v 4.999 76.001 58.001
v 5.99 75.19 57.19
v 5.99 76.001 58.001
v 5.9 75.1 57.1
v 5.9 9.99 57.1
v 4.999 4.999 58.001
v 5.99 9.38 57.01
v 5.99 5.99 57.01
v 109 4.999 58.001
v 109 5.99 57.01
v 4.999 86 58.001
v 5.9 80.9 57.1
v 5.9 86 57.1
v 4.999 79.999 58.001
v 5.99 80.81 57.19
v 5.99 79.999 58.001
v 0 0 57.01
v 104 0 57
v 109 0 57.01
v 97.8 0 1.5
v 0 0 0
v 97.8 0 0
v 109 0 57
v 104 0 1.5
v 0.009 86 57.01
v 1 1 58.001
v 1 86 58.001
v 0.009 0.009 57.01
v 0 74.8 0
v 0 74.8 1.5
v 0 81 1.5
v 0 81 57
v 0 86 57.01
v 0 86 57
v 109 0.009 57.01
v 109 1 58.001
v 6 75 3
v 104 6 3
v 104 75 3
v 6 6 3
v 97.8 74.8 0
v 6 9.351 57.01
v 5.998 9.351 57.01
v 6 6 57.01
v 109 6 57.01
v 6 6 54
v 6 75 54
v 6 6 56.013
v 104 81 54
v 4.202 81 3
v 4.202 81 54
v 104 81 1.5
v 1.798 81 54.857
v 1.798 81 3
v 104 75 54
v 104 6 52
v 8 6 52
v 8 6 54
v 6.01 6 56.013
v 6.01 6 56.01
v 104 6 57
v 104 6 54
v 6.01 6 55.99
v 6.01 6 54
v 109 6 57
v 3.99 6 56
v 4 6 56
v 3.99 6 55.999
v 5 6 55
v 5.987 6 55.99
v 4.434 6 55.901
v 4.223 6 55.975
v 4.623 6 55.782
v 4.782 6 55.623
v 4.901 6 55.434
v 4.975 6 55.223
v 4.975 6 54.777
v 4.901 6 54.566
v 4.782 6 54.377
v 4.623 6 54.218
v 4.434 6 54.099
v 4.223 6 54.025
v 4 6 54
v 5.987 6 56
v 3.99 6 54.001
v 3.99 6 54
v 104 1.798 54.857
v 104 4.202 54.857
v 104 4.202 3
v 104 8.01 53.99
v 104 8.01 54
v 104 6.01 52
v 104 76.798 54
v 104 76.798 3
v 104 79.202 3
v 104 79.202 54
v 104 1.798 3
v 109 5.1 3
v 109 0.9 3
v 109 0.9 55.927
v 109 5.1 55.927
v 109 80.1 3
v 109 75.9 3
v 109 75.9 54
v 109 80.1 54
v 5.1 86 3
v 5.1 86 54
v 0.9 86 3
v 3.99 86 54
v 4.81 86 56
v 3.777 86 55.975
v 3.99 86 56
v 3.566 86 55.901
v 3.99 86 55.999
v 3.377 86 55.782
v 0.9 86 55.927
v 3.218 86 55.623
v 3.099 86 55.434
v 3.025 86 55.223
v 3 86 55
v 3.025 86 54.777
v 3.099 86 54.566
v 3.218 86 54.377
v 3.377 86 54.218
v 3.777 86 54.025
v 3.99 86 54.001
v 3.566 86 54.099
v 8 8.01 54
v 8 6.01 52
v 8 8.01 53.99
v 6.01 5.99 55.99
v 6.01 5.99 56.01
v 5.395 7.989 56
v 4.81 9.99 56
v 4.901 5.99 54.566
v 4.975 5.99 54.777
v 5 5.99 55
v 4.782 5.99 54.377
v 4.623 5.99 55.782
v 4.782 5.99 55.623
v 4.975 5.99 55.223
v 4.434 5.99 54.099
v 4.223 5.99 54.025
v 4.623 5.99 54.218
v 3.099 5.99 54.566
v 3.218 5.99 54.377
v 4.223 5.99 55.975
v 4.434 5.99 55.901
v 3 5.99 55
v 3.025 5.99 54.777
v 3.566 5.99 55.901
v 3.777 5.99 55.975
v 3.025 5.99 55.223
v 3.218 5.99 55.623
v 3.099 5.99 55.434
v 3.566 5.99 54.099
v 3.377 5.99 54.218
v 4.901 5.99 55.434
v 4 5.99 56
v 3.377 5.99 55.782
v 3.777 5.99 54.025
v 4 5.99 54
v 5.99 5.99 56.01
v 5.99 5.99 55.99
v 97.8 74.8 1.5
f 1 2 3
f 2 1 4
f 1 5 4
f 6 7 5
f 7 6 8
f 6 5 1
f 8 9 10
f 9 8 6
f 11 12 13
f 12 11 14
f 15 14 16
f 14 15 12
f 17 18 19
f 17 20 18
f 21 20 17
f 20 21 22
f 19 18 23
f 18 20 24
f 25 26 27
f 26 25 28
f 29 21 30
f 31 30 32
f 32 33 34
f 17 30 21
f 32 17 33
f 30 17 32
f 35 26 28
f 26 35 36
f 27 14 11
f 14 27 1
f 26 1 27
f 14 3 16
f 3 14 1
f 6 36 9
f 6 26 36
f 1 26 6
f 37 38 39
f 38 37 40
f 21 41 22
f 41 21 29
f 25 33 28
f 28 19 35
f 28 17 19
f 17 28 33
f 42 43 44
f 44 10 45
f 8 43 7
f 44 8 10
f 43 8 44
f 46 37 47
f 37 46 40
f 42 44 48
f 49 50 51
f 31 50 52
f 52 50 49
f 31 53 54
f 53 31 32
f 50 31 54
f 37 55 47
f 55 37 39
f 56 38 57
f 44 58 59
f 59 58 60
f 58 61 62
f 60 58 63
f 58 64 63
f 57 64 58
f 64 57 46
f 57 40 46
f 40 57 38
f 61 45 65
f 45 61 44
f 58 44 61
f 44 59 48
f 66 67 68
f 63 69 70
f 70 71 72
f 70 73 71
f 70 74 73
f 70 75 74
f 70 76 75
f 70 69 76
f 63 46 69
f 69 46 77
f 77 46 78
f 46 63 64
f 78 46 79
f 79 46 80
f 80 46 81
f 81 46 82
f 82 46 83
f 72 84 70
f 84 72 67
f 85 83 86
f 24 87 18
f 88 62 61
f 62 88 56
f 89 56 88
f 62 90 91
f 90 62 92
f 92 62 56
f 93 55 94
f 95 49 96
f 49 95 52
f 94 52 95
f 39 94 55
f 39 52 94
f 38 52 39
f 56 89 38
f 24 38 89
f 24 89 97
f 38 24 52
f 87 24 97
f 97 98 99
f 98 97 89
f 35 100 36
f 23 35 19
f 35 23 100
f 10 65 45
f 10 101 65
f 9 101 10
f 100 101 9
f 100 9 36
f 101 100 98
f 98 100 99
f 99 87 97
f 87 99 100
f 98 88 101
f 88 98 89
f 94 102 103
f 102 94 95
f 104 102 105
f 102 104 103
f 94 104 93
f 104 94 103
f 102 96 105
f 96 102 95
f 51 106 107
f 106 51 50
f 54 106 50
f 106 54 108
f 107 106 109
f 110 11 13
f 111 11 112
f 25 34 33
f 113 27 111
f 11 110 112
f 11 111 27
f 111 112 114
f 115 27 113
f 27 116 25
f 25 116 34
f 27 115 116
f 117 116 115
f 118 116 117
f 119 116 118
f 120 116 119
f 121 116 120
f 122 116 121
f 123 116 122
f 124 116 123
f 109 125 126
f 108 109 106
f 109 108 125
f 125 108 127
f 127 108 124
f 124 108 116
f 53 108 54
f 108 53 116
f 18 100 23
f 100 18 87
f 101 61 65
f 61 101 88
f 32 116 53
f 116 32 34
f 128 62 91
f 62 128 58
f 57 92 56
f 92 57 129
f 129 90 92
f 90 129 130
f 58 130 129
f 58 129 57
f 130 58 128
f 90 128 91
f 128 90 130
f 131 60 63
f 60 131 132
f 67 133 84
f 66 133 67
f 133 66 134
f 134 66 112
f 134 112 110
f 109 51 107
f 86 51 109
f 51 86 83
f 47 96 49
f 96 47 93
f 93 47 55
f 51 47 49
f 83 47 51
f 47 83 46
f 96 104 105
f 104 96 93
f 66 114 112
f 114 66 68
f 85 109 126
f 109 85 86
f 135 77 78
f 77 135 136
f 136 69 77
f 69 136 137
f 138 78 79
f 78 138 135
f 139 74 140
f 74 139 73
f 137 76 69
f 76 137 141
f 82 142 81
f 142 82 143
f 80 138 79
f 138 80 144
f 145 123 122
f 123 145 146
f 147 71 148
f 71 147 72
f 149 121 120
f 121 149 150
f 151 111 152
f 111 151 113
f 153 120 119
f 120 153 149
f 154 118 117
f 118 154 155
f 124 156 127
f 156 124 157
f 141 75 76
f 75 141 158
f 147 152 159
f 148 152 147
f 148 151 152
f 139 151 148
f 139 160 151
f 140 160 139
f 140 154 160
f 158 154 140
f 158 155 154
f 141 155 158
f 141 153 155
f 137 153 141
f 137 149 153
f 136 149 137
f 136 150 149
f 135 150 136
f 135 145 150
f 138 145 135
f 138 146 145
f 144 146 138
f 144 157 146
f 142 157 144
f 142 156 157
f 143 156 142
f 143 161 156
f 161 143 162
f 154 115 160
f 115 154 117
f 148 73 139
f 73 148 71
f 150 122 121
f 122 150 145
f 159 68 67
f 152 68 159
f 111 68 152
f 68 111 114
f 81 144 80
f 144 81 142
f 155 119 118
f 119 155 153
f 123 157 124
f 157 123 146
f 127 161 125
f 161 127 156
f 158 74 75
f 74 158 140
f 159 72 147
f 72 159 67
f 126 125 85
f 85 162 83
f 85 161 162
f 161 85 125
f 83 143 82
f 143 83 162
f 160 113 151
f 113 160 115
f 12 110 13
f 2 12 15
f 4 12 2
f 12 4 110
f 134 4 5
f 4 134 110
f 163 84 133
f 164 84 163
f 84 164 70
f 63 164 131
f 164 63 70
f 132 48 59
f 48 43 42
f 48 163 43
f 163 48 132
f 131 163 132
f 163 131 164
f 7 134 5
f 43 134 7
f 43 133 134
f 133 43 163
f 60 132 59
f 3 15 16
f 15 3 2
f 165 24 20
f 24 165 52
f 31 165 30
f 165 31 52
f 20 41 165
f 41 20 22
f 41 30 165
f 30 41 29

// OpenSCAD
// ============================================================================
// cutlery_box.scad
// Graduated 3-chamber disposable-cutlery box (Option 3) — CUT-FROM-SOLID port
// of build_box.py, for a 120 x 120 x 120 mm printer (AOSEED).
//
// WHY THIS PORT EXISTS (the whole point):
//   The hand-mesh generator (build_box.py) could not keep the 1 mm rim chamfer
//   continuous across the female dovetail joints, because where a slot's flared
//   corner crosses the sloped chamfer it needs a true boolean intersection.
//   OpenSCAD HAS that boolean kernel, so here we do exactly the "cut-from-solid"
//   thing:
//      1. Build the ENTIRE box as ONE solid, WITH the chamfer already on it.
//      2. difference() out vertical dovetail prisms ( /_\ cross-section ),
//         running from just above the base plate up THROUGH the rim, to both
//         (a) form the sliding-dovetail joints, and
//         (b) split the box into 6 bed-sized pieces.
//   Because the cut is a real boolean through the already-chamfered solid, the
//   sloped chamfer<->slot edge is produced for free => the rim chamfer stays
//   CONTINUOUS across every joint, with none of the sliver hacks.
//
// ----------------------------------------------------------------------------
// HOW TO USE
//   In the app:  set `part` below (or use the Customizer dropdown), F5 to
//                preview, F6 to render, then File > Export > STL.
//   One piece (CLI):
//      openscad -o body_knife_A.stl -D 'part="knife_A"' cutlery_box.scad
//   ALL SIX (bash, run from this folder):
//      for p in knife_A knife_B fork_A fork_B spoon_A spoon_B; do \
//        openscad -o "body_$p.stl" -D "part=\"$p\"" cutlery_box.scad ; done
//   PNG preview of one piece:
//      openscad -o knife_B.png --imgsize=1400,1000 --autocenter --viewall \
//        -D 'part="knife_B"' cutlery_box.scad
//
//   Pieces are modelled in ASSEMBLED coordinates (floor-down, z=0 is the bed),
//   so importing all six STLs together shows the assembled box directly; your
//   slicer will auto-drop each one onto the plate for printing.
//
// BED SANITY: every piece is <= 120 mm in X, Y, Z.
//   Z = 58 mm. Widest piece = spoon at 117 mm (Y). A-halves reach 109 mm (X,
//   including the protruding dovetail key). All under 120.
//
// !! I could NOT run OpenSCAD to verify this file (no binary in my sandbox) !!
//   - The rim chamfer is a SMOOTH, true-45 bevel built from hull() frustums of
//     convex rectangles. Works in every OpenSCAD since ~2015 (incl. Homebrew
//     2021.01). No stepped staircase -- and, crucially, it makes box() a clean
//     well-formed solid so the per-part booleans resolve reliably (the old
//     14-slice staircase was fragile and CGAL was dropping the walls of the
//     interior parts, leaving only the key prisms => "floating boxes").
//   - roof() is still available behind USE_ROOF=true for those who have it
//     (2021.01+ snapshots); for THIS rectangular design it is identical, so it
//     is NOT required.
//   - After F6, check the console for "WARNING"/"not a valid 2-manifold".
//     If a tenon ever looks detached, bump EPS to 0.05.
// ============================================================================


/* [Part to render / export] */
part = "knife_A"; // [knife_A, knife_B, fork_A, fork_B, spoon_A, spoon_B, assembly]

/* [Chamfer method] */
// false = smooth hull() frustum bevel (default, any OpenSCAD); true = roof() (2021.01+)
USE_ROOF = false;

/* [Heights (mm)] */
BASE   = 3.0;     // floor / base-plate thickness
COMP_H = 55.0;    // interior wall height above the floor (cutlery stack depth)

/* [Walls (mm)] */
HOST_T   = 6.0;     // thickness of every wall (thick enough to host a dovetail)
HALF_LEN = 104.0;   // printed length of each half (A = near, B = far); <120 incl. key

/* [Chamber bays (mm)] */
N_COL     = 3;       // columns of cutlery per chamber
KNIFE_COL = 23.0;    // -> knife bay 69  (3 x 19 mm knives + play)
FORK_COL  = 33.0;    // -> fork  bay 99  (3 x 29 mm forks  + play)
SPOON_COL = 37.0;    // -> spoon bay 111 (3 x 34 mm spoons + play, trimmed <120)

/* [Dovetail joint (mm)] */
DT_DEPTH = 5.0;   // tail protrusion past the seam (male key depth)
DT_NECK  = 1.2;   // half-width at the seam face (narrow)
DT_FLARE = 2.1;   // half-width at the tip (wide -> locks)
DT_CLR   = 0.4;   // FLANK/seam slide clearance added to the female socket (do not change for fit)
DT_DEPTH_RELIEF = 0.3; // extra depth on the socket BACK only, so the tail tip never bottoms out

/* [Hidden-dovetail top cap / "hat" (mm)] */
// The dovetail otherwise shows its trapezoid outline on the TOP edge of the wall.
// To hide it, the MALE piece extends the wall's full-width top (chamfer included)
// across the key footprint -> a flush, continuous top. The FEMALE piece gets a
// matching top RECESS (cap footprint + CAP_CLR) so the cap drops straight in.
// Result: the top reads as one surface with a single straight seam line at the cap
// tip; the dovetail joinery lives entirely below the cap.
//
// SELF-SUPPORTING UNDERSIDE: the cap reaches the FULL wall width at the chamfer base
// (so the top edge reads as the wall extended, with NO recessed sliver on the outer
// face), and its underside is ONE planar ramp from the chamfer's OUTER CORNER
// (half-width HOST_T/2 at z = BODY_H-CHAMFER) down to the dovetail-neck half-width
// (CAP_FOOT) at CAP_SLANT_DEG from horizontal. No little horizontal step. The ramp
// reaching full width exactly at the chamfer base means "ramp top" == "chamfer base"
// (CAP_H is DERIVED). The FEMALE recess is the same ramp + CAP_CLR play.
// TRADEOFF: because the cap runs all the way to the outer corner, the female wall
// tapers to ~0 at z = BODY_H-CHAMFER -> a thin feather edge at the joint (gradual at
// CAP_SLANT_DEG, hidden inside the joint when assembled). Accepted per design intent.
CAP_SLANT_DEG = 50;     // cap underside ramp angle from horizontal (50 = self-supporting, long flare)
CAP_FOOT = DT_NECK;     // cap-underside half-width where it meets the dovetail neck
CAP_CLR = 0.3;          // slide clearance so the male cap seats into the female top recess

/* [Rim chamfer (mm)] */
CHAMFER = 1.0;    // 45-deg comfort break broken along the top wall edges

/* [Base half-lap / anti-warp (mm)] */
// Neighbouring base plates overlap as a HORIZONTAL half-lap (shiplap) at mid-base
// height, so corners stay coplanar (no lift/protrusion). Horizontal lap faces do
// NOT bind the vertical-drop assembly. Shingle direction: A->B and knife->fork->spoon.
LAP_LEN = 6;        // overlap past the A/B seam and the knife/fork seam
LAP_LEN_FS = 2;     // overlap past the fork/SPOON seam -- SMALLER: spoon is the
                    // tightest piece (117mm of the 120mm bed); a 6mm lap there
                    // would push spoon to 123mm. 2mm keeps spoon at 119mm.
LAP_Z   = BASE/2;   // 1.5 -- horizontal split height of the lap (bottom vs top half)
LAP_CLR = 0.2;      // in-plane clearance so the shelf isn't a press fit

/* [Lid — box features that receive a flat ORDERED clear sheet] */
// The lid itself is NOT printed: it's a flat ~2 mm PETG/Tritan sheet, bullnose-polished
// edges (r=LID_EDGE_R), ordered to size. We only model the box features that receive it.
LID_T            = 2.0;   // ordered sheet thickness
LID_EDGE_R       = 1.0;   // ordered sheet bullnose edge radius (for the sheet order spec)
LID_PLAY         = 0.4;   // total vertical play in the hinge groove (sheet + this)
LID_RECESS       = 2.0;   // lid TOP sits this far BELOW the rim, so the journal pocket is fully
                          // capped (rim caps the bullnose -> retains the lid when raised; tilt-in)
HINGE_AT_MINUS_X = true;  // hinge on the -x (303mm) end wall; clip on +x. (flip = mirror; default delivered)
// perimeter support ledge (lid underside rests on it at z = BODY_H-LID_T)
LEDGE_W          = 2.0;   // ledge inward protrusion (its underside ramps back at 45 deg -> self-supporting)
GROOVE_END_INSET = 0.0;   // journal runs the full chamber width, right to the corners
GROOVE_TAPER     = 4.0;   // y-length over which the eased mouth tapers out at each groove end
// hinge journal (cut into the inner face of the hinge end wall, CONTINUOUS along the long edge)
GROOVE_DEPTH     = 3.0;   // 2mm lead-in slot + 1mm pocket radius -> journal sits 2mm back from the
                          // face so its cap clears the swing relief and RETAINS the lid
GROOVE_POCKET_R  = 1.0;   // journal half-cylinder radius (the bullnose sheet edge rolls in it)
GROOVE_MOUTH_EASE= 1.2;   // 45 deg ease on the slot's inner-top lip so the sheet swings up & lifts out
// clip latch (one localized retainer, centered on the clip end wall)
CLIP_W           = 18.0;  // clip width
CLIP_LIP         = 0.4;   // retaining overhang (0.3 light .. 0.6 firm)
CLIP_RAMP_H      = 1.6;   // cam-ramp height above the rim (press-to-close)
// finger scallop (semicircular dish in the rim, centered on & aligned with the clip)
SCALLOP_W        = 16.0;  // scallop width
SCALLOP_DEPTH    = 6.0;   // how far it dishes down from the rim


/* [Hidden] */
EPS      = 0.01;          // tiny overlap so abutting solids fuse cleanly in CGAL
// Upper-chamber pieces (fork, spoon) were cut by a cell plane laid EXACTLY on the
// divider wall's far face (the lower chamber owns that wall). intersection() along a
// plane coincident with an existing box face makes CGAL leave a ZERO-THICKNESS copy
// of the wall face -> edge-manifold + "watertight" but degenerate (OpenSCAD shows it
// as a blue back-face; Tinkercad thickens it into a phantom block). SEAM_EPS nudges
// those cut planes a hair INTO the open bay so they no longer coincide with any box
// face -> no flap. 0.02 mm is physically nothing but is well clear of CGAL's tolerance.
SEAM_EPS = 0.02;
CUT_OVER = 1.0;           // how far dovetail cutters overshoot the rim (clean cut)

BODY_H    = BASE + COMP_H;     // 58  total height
END_WALL  = HOST_T;            // end walls are dovetail hosts too -> equally thick
TOTAL_LEN = 2 * HALF_LEN;      // 208 assembled length (end wall .. end wall)

// hidden-cap ramp geometry (derived).
//   CAP_HW    = cap MAX half-width = HOST_T/2 (the full wall edge) at the chamfer base.
//   CAP_RISE  = vertical height of the self-supporting CAP_SLANT_DEG underside ramp.
//   CAP_ZRAMP = where the cap reaches full width = the chamfer base (BODY_H-CHAMFER), so
//               the ramp runs straight to the chamfer OUTER CORNER (no horizontal step).
//   CAP_ZBOT  = cap bottom = ramp start; CAP_H derived from it (for reference/report).
//   CAP_ZRAMP_R = recess ramp top, shifted down by CAP_CLR so the recess ramp stays
//               parallel to the cap ramp with uniform play.
CAP_HW      = HOST_T/2;   // cap reaches the FULL wall edge at the chamfer base
CAP_RISE    = (CAP_HW - CAP_FOOT) * tan(CAP_SLANT_DEG);
CAP_ZRAMP   = BODY_H - CHAMFER;               // full width exactly at the chamfer base / outer corner
CAP_ZBOT    = CAP_ZRAMP - CAP_RISE;
CAP_H       = BODY_H - CAP_ZBOT;              // derived; reported
CAP_ZRAMP_R = CAP_ZRAMP;   // recess ramp ALSO tops at the chamfer corner (mirror the cap) -> no vertical lip
// sanity checks
assert(CAP_ZBOT > BASE + 1,
       "cap zone dips too low -- raise CAP_SLANT_DEG");
assert(CAP_HW >= DT_FLARE,
       "cap too narrow to cover the dovetail tail");

// NOTE: lid-derived constants are defined BELOW the Y-layout block, because some of
// them (INTERIOR_Y0/Y1, CLIP_CY) depend on OUTER_L / OUTER_R / EXT_W. See "lid derived".

// bay widths
KNIFE_BAY = N_COL * KNIFE_COL; // 69
FORK_BAY  = N_COL * FORK_COL;  // 99
SPOON_BAY = N_COL * SPOON_COL; // 111

// ---- Y layout (width direction): wall | bay | divider | bay | divider | bay | wall
KNIFE_Y0 = 0;
KNIFE_Y1 = HOST_T + KNIFE_BAY + HOST_T;        // 0..81   (outer wall + bay + divider)
FORK_Y0  = KNIFE_Y1;                           // 81
FORK_Y1  = FORK_Y0 + FORK_BAY + HOST_T;        // 81..186 (bay + divider)
SPOON_Y0 = FORK_Y1;                            // 186
SPOON_Y1 = SPOON_Y0 + SPOON_BAY + HOST_T;      // 186..303(bay + outer wall)
EXT_W    = SPOON_Y1;                           // 303 total width

// lengthwise wall Y-bands [y0,y1] (host the A/B dovetails) + their centers
OUTER_L  = [0, HOST_T];                                       // [0,6]    c=3
DIV_KF   = [HOST_T + KNIFE_BAY, HOST_T + KNIFE_BAY + HOST_T]; // [75,81]  c=78
DIV_FS   = [FORK_Y0 + FORK_BAY, FORK_Y0 + FORK_BAY + HOST_T]; // [180,186]c=183
OUTER_R  = [SPOON_Y1 - HOST_T, SPOON_Y1];                     // [297,303]c=300

// ---- lid derived ---- (placed AFTER OUTER_L/OUTER_R/EXT_W so nothing is forward-referenced)
LID_TOP_Z   = BODY_H - LID_RECESS;        // 56  lid TOP (recessed); rim z=58 rises LID_RECESS above it
LID_Z_UNDER = LID_TOP_Z - LID_T;          // 54  lid underside / ledge top / lowered-divider top
POCKET_CZ   = LID_TOP_Z - LID_T/2;        // 55  journal centre (lid mid) -> pocket top = LID_TOP_Z = capped
// hinge end-wall inner face x + inward direction; clip end-wall inner face x + inward dir
HINGE_INX   = HINGE_AT_MINUS_X ? END_WALL : TOTAL_LEN - END_WALL;       // 6  (default)
HINGE_IN    = HINGE_AT_MINUS_X ? 1 : -1;  // interior direction from the hinge wall (+x default)
CLIP_INX    = HINGE_AT_MINUS_X ? TOTAL_LEN - END_WALL : END_WALL;       // 202 (default)
CLIP_IN     = HINGE_AT_MINUS_X ? -1 : 1;  // interior direction from the clip wall (-x default)
POCKET_CX   = HINGE_INX - HINGE_IN*(GROOVE_DEPTH - GROOVE_POCKET_R);    // 5  pocket centre x (INTO the wall)
INTERIOR_Y0 = OUTER_L[1];                 // 6   inner face of the -y short wall
INTERIOR_Y1 = OUTER_R[0];                 // 297 inner face of the +y short wall
CLIP_CY     = EXT_W/2;                     // 151.5 clip/scallop centre (in the fork chamber)
assert(POCKET_CZ - GROOVE_POCKET_R > BASE + 1,
       "journal dips too low -- reduce LID_RECESS or LID_T");
assert(POCKET_CZ + GROOVE_POCKET_R <= LID_TOP_Z + EPS,
       "journal not capped -- lower the lid (raise LID_RECESS) or shrink GROOVE_POCKET_R");
// NOTE: with LID_RECESS the lid underside (and lowered dividers) sit BELOW CAP_ZBOT. That is
// intended: the inner dividers are cut flat below the cap zone (their hidden caps are removed,
// but the lid covers them); the perimeter/end-wall caps are untouched (full-height walls).

// the three OPEN bays are rectangular holes in the wall footprint:
//   footprint = outer rectangle MINUS these bays  (== the 6 walls; verified).
// The smooth chamfer is built from exactly this decomposition.
BAY_X0 = END_WALL;              // 6
BAY_X1 = TOTAL_LEN - END_WALL;  // 202
BAYS = [
    [BAY_X0, BAY_X1, HOST_T,   HOST_T + KNIFE_BAY],   // knife bay [6,202] x [6,75]
    [BAY_X0, BAY_X1, FORK_Y0,  FORK_Y0 + FORK_BAY],   // fork  bay [6,202] x [81,180]
    [BAY_X0, BAY_X1, SPOON_Y0, SPOON_Y0 + SPOON_BAY], // spoon bay [6,202] x [186,297]
];

YC_OUTL  = OUTER_L[0] + HOST_T/2;   // 3   outer-left wall center
YC_DIVKF = DIV_KF[0]  + HOST_T/2;   // 78  knife/fork divider center
YC_DIVFS = DIV_FS[0]  + HOST_T/2;   // 183 fork/spoon divider center
YC_OUTR  = OUTER_R[0] + HOST_T/2;   // 300 outer-right wall center

// seams
AB_SEAM = HALF_LEN;               // 104  A/B length seam (x)
SEAM_KF = FORK_Y0;                // 81   knife/fork width seam (y)
SEAM_FS = SPOON_Y0;              // 186  fork/spoon width seam (y)
ENDC_A  = END_WALL/2;             // 3    A end-wall center (x) -> chamber dovetails
ENDC_B  = TOTAL_LEN - END_WALL/2; // 205  B end-wall center (x)


// ============================================================================
// 2D wall footprint (cross-section of all walls, constant in z for the straight
// part). Union of: 2 full-width end walls + 4 lengthwise walls between them.
// ============================================================================
module wall_footprint_2d() {
    // footprint = outer rectangle minus the 3 open bays  (== the 6 walls)
    difference() {
        square([TOTAL_LEN, EXT_W]);
        for (b = BAYS) translate([b[0], b[2]]) square([b[1] - b[0], b[3] - b[2]]);
    }
}

// ============================================================================
// The full chamfered box solid = base plate + walls with a continuous 1 mm
// top-rim chamfer. Built ONCE; every piece is carved out of this.
// ============================================================================
module chamfer_cap() {
    // SMOOTH 45 rim chamfer over z[BODY_H-CHAMFER, BODY_H], in absolute coords.
    zm = BODY_H - CHAMFER;
    if (USE_ROOF) {
        // exact straight-skeleton roof, capped at CHAMFER height (needs roof()).
        intersection() {
            translate([0,0,zm]) roof() wall_footprint_2d();
            translate([0,0,zm]) linear_extrude(CHAMFER + EPS) wall_footprint_2d();
        }
    } else {
        // DEFAULT: true 45 bevel as hull() frustums of CONVEX rectangles -> smooth
        // AND a clean manifold.  Since footprint = outer - bays, the chamfer of the
        // footprint = (outer rectangle beveled inward) MINUS (each bay beveled so it
        // grows toward the top, which bevels every bay-facing rim).  All hull()s are
        // on convex rectangles, so nothing gets convex-filled.
        difference() {
            // outer perimeter frustum: full outer rect at zm -> inset by CHAMFER at top
            hull() {
                translate([0,0,zm])     linear_extrude(0.001) square([TOTAL_LEN, EXT_W]);
                translate([0,0,BODY_H]) linear_extrude(0.001) offset(delta=-CHAMFER) square([TOTAL_LEN, EXT_W]);
            }
            // each bay grows by CHAMFER toward the top -> bevels its surrounding rim.
            // (overshoots z a hair past both ends so the cut is clean.)
            for (b = BAYS)
                hull() {
                    translate([0,0,zm-EPS])     linear_extrude(0.001)
                        translate([b[0],b[2]]) offset(delta=-EPS)        square([b[1]-b[0], b[3]-b[2]]);
                    translate([0,0,BODY_H+EPS]) linear_extrude(0.001)
                        translate([b[0],b[2]]) offset(delta=CHAMFER+EPS) square([b[1]-b[0], b[3]-b[2]]);
                }
        }
    }
}

module box() {
    zm = BODY_H - CHAMFER;
    union() {
        cube([TOTAL_LEN, EXT_W, BASE]);                                        // base plate z[0,3]
        translate([0,0,BASE]) linear_extrude(zm - BASE + EPS) wall_footprint_2d(); // straight walls z[3,57]
        chamfer_cap();                                                         // smooth chamfer z[57,58]
    }
}

// ============================================================================
// Dovetail prisms ( /_\ ). Vertical, z[BASE, BODY_H+CUT_OVER] so they cut
// through the rim but leave the base plate continuous. The near face is pushed
// back EPS so a male key always fuses to its wall.
//   male key   : half_n=DT_NECK,         half_f=DT_FLARE
//   female slot: half_n=DT_NECK+DT_CLR,  half_f=DT_FLARE+DT_CLR
// ============================================================================
module dt_prism_X(seam_x, yc, half_n, half_f) {   // perpendicular to X, grows +X
    translate([0,0,BASE]) linear_extrude(BODY_H - BASE + CUT_OVER)
        polygon([[seam_x - EPS,        yc - half_n],
                 [seam_x + DT_DEPTH,   yc - half_f],
                 [seam_x + DT_DEPTH,   yc + half_f],
                 [seam_x - EPS,        yc + half_n]]);
}
module dt_prism_Y(seam_y, xc, half_n, half_f) {   // perpendicular to Y, grows +Y
    translate([0,0,BASE]) linear_extrude(BODY_H - BASE + CUT_OVER)
        polygon([[xc - half_n, seam_y - EPS],
                 [xc - half_f, seam_y + DT_DEPTH],
                 [xc + half_f, seam_y + DT_DEPTH],
                 [xc + half_n, seam_y - EPS]]);
}
module ab_key   (yc)        { dt_prism_X(AB_SEAM, yc, DT_NECK, DT_FLARE); }
module ch_key   (seam_y, xc){ dt_prism_Y(seam_y, xc, DT_NECK, DT_FLARE); }

// Female sockets = male + DT_CLR on the flanks/seam (unchanged), PLUS a straight
// back-face relief of DT_DEPTH_RELIEF so the tail tip never bottoms out. The
// relief is a rectangle tacked onto the trapezoid's tip at the SAME flare width,
// so the angled flank faces (and their 0.4 mm slide clearance) are untouched.
module ab_socket(yc) {
    dt_prism_X(AB_SEAM, yc, DT_NECK + DT_CLR, DT_FLARE + DT_CLR);
    translate([0,0,BASE]) linear_extrude(BODY_H - BASE + CUT_OVER)
        translate([AB_SEAM + DT_DEPTH, yc - (DT_FLARE + DT_CLR)])
            square([DT_DEPTH_RELIEF, 2*(DT_FLARE + DT_CLR)]);          // back relief, +X
}
module ch_socket(seam_y, xc) {
    dt_prism_Y(seam_y, xc, DT_NECK + DT_CLR, DT_FLARE + DT_CLR);
    translate([0,0,BASE]) linear_extrude(BODY_H - BASE + CUT_OVER)
        translate([xc - (DT_FLARE + DT_CLR), seam_y + DT_DEPTH])
            square([2*(DT_FLARE + DT_CLR), DT_DEPTH_RELIEF]);          // back relief, +Y
}

// ===== hidden-dovetail top cap ("hat"), SELF-SUPPORTING underside ===============
// MALE cap: a FULL-wall-width hat whose underside is ONE planar ramp from the chamfer's
// OUTER CORNER (half-width CAP_HW = HOST_T/2 at CAP_ZRAMP = BODY_H-CHAMFER) down to the
// dovetail-neck half-width (CAP_FOOT) at CAP_SLANT_DEG from horizontal -> the self-
// supporting shoulder, running straight to the corner (no horizontal step). Built as
// hull(narrow bottom slab buried in the tail neck, full-width top slab through the rim);
// box() trims it to the wall and adds the continuous rim chamfer for free, so the outer
// top edge reads as the wall extended (no recessed sliver). The protruding NOSE is left
// SQUARE (vertical) -- hidden in the female socket when assembled.
// TRADEOFF: the female wall tapers to ~0 at z=BODY_H-CHAMFER (a thin feather edge at the
// joint, gradual at CAP_SLANT_DEG) -- accepted per design intent.
module ab_cap(yc) {   // A/B seam, grows +X past the seam (length direction)
    hull() {
        translate([AB_SEAM - EPS, yc - CAP_FOOT, CAP_ZBOT])
            cube([DT_DEPTH + EPS, 2*CAP_FOOT, EPS]);
        translate([AB_SEAM - EPS, yc - CAP_HW,   CAP_ZRAMP])
            cube([DT_DEPTH + EPS, 2*CAP_HW, (BODY_H + CUT_OVER) - CAP_ZRAMP]);
    }
}
module ch_cap(seam_y, xc) {   // chamber seam, grows +Y past the seam (in the end wall)
    hull() {
        translate([xc - CAP_FOOT, seam_y - EPS, CAP_ZBOT])
            cube([2*CAP_FOOT, DT_DEPTH + EPS, EPS]);
        translate([xc - CAP_HW,   seam_y - EPS, CAP_ZRAMP])
            cube([2*CAP_HW, DT_DEPTH + EPS, (BODY_H + CUT_OVER) - CAP_ZRAMP]);
    }
}
// FEMALE recess: the SAME ramp grown by CAP_CLR (flanks, tip, floor, and ramp shifted down
// by CAP_CLR so it stays parallel) -> the cap seats with uniform slide clearance. It opens
// to the wall edge (and a hair past, into air) so the cap's full-width corner drops in;
// this is what leaves the thin female feather at the top (accepted). Open upward + toward seam.
module ab_cap_neg(yc) {
    hull() {
        translate([AB_SEAM - EPS, yc - (CAP_FOOT + CAP_CLR), CAP_ZBOT - CAP_CLR])
            cube([DT_DEPTH + CAP_CLR + EPS, 2*(CAP_FOOT + CAP_CLR), EPS]);
        translate([AB_SEAM - EPS, yc - (CAP_HW + EPS), CAP_ZRAMP_R])
            cube([DT_DEPTH + CAP_CLR + EPS, 2*(CAP_HW + EPS), (BODY_H + CUT_OVER + 1) - CAP_ZRAMP_R]);
    }
}
module ch_cap_neg(seam_y, xc) {
    hull() {
        translate([xc - (CAP_FOOT + CAP_CLR), seam_y - EPS, CAP_ZBOT - CAP_CLR])
            cube([2*(CAP_FOOT + CAP_CLR), DT_DEPTH + CAP_CLR + EPS, EPS]);
        translate([xc - (CAP_HW + EPS), seam_y - EPS, CAP_ZRAMP_R])
            cube([2*(CAP_HW + EPS), DT_DEPTH + CAP_CLR + EPS, (BODY_H + CUT_OVER + 1) - CAP_ZRAMP_R]);
    }
}

// rectangular cell (x[xa,xb], y[ya,yb], full height + margin) used to split pieces
module cell(xa, xb, ya, yb) {
    translate([xa, ya, -1]) cube([xb - xa, yb - ya, BODY_H + 11]);
}

// ===== base half-lap (shiplap) =================================================
// HORIZONTAL lap at mid-base height: the shelf-owner keeps its BOTTOM half
// (z 0..LAP_Z) extending LAP_LEN past the seam; the neighbour has its bottom half
// REMOVED there (keeps only the top half) and lands flat on the shelf. Horizontal
// faces => no binding during the vertical drop. Shelves live entirely in the base
// (z < BASE), well clear of the wall dovetails (z >= BASE).
// Shingle = FEMALE-first (matches the no-notch dovetail assembly order, which
// lowers the male piece onto the female): the B half owns the A/B shelf (grows
// -X into A) and the UPPER chamber (fork, spoon) owns the chamber shelf (grows
// -Y into the lower chamber).  Order: spoon, fork, knife; B before A.
module lap_shelf_X(y0, y1) {                 // B-side shelf, grows -X into A past AB_SEAM
    // +EPS past AB_SEAM so the shelf interpenetrates (not just abuts) its own B body -> fuses cleanly.
    translate([AB_SEAM - LAP_LEN, y0, 0]) cube([LAP_LEN + EPS, y1 - y0, LAP_Z]);
}
module lap_neg_X(y0, y1) {                   // A-side: remove bottom half to receive it
    translate([AB_SEAM - LAP_LEN - LAP_CLR, y0 - EPS, -EPS])
        cube([LAP_LEN + LAP_CLR + EPS, (y1 - y0) + 2*EPS, LAP_Z + EPS]);
}
module lap_shelf_Y(seam_y, x0, x1, ln=LAP_LEN) {   // upper-chamber shelf, grows -Y into lower
    // grows -Y by `ln` into the lower chamber AND +Y by 2*SEAM_EPS past the seam so it
    // always overlaps the (SEAM_EPS-nudged) body floor and stays fused -> no floating shelf.
    translate([x0, seam_y - ln, 0]) cube([x1 - x0, ln + 2*SEAM_EPS, LAP_Z]);
}
module lap_neg_Y(seam_y, x0, x1, ln=LAP_LEN) {     // lower-chamber: remove bottom half
    translate([x0 - EPS, seam_y - ln - LAP_CLR, -EPS])
        cube([(x1 - x0) + 2*EPS, ln + LAP_CLR + EPS, LAP_Z + EPS]);
}

// ============================================================================
// LID FEATURES (receive a flat ORDERED clear sheet; the sheet is not printed).
// All features live at the TOP (z >= ~52), ABOVE the dovetail engagement, the half-lap
// (z<1.5) and most of the hat, so the vertical-drop assembly and joints are untouched.
// EPS overlaps throughout; no coincident coplanar faces with the existing walls.
// Default orientation: HINGE on the -x end wall (A pieces), CLIP on the +x end wall
// (B pieces), clip+scallop centred on the fork (middle) chamber.
// ============================================================================

// --- perimeter support ledge: 45-deg self-supporting brackets; rest face at LID_Z_UNDER.
//     Runs along the CLIP end wall + the two short outer walls. (Hinge wall uses the groove.)
//     Built as hull(thin top edge, wall column) -> a triangular bracket whose underside is
//     a 45-deg ramp (prints floor-down with no support). ADDED to each piece (clipped by cell).
//     Each run is INSET by LEDGE_W from the perpendicular walls so the three brackets never
//     overlap at a corner and the wall's normal chamfer wraps every corner uninterrupted.
module lid_ledge() {
    cy0 = INTERIOR_Y0 + LEDGE_W;  cy1 = INTERIOR_Y1 - LEDGE_W;  cyl = cy1 - cy0;   // clip-run y span (inset)
    sx0 = END_WALL    + LEDGE_W;  sxl = (TOTAL_LEN - 2*END_WALL) - 2*LEDGE_W;       // short-run x span (inset)
    // clip end wall (x = CLIP_INX), bracket protrudes toward interior (CLIP_IN)
    hull() {
        translate([CLIP_INX + CLIP_IN*LEDGE_W, cy0, LID_Z_UNDER - EPS]) cube([EPS, cyl, EPS]);
        translate([CLIP_INX - EPS,             cy0, LID_Z_UNDER - LEDGE_W]) cube([2*EPS, cyl, LEDGE_W]);
    }
    // OUTER_L short wall (y = INTERIOR_Y0), bracket protrudes +y
    hull() {
        translate([sx0, INTERIOR_Y0 + LEDGE_W, LID_Z_UNDER - EPS]) cube([sxl, EPS, EPS]);
        translate([sx0, INTERIOR_Y0 - EPS,     LID_Z_UNDER - LEDGE_W]) cube([sxl, 2*EPS, LEDGE_W]);
    }
    // OUTER_R short wall (y = INTERIOR_Y1), bracket protrudes -y
    hull() {
        translate([sx0, INTERIOR_Y1 - LEDGE_W, LID_Z_UNDER - EPS]) cube([sxl, EPS, EPS]);
        translate([sx0, INTERIOR_Y1 - EPS,     LID_Z_UNDER - LEDGE_W]) cube([sxl, 2*EPS, LEDGE_W]);
    }
}

// --- hinge groove: a lead-in slot + a journal half-cylinder pocket, CAPPED at the recessed
//     lid top (LID_TOP_Z). The rim (z[LID_TOP_Z,BODY_H]) caps the bullnose so the lid is
//     RETAINED when raised. Insertion is TILT-IN: raise the lid to the open angle, slide the
//     bullnose under the cap into the journal, swing down to close. A 45-deg mouth-ease
//     relieves the cap's inner-bottom edge (corner at HINGE_INX, LID_TOP_Z) so the lid clears
//     as it swings; the relief TAPERS to nothing over GROOVE_TAPER at each end (clean corners).
//     CONTINUOUS along the long edge (y ~8..295); shaves only the top inner tips of the two
//     chamber dovetails -- engagement below the journal and the ~3mm outer wall remain.
EPX_MOUTH = HINGE_INX;   // mouth-ease anchor = the cap's inner-face / lid-top corner
module mouth_tri() {                                 // 2D relief triangle (x,z) at the cap bottom-inner corner
    polygon([[EPX_MOUTH,                            LID_TOP_Z - EPS],
             [EPX_MOUTH,                            LID_TOP_Z + GROOVE_MOUTH_EASE],
             [EPX_MOUTH - HINGE_IN*GROOVE_MOUTH_EASE, LID_TOP_Z - EPS]]);
}
module mouth_slab(yc, dy) {                          // thin mouth-ease slice centred at yc
    translate([0, yc - dy/2, 0]) rotate([90,0,0]) translate([0,0,-dy]) linear_extrude(dy) mouth_tri();
}
module mouth_taper(yApex, yFull) {                   // wedge: vanishes at yApex, full at yFull
    hull() {
        mouth_slab(yFull, 2*EPS);
        translate([EPX_MOUTH - EPS, yApex - EPS, LID_TOP_Z - EPS]) cube([2*EPS, 2*EPS, 2*EPS]);
    }
}
module hinge_groove() {
    gy0 = INTERIOR_Y0 + GROOVE_END_INSET;            // 8    start (inset past the corner chamfer)
    gy1 = INTERIOR_Y1 - GROOVE_END_INSET;            // 295  end
    sx0 = min(POCKET_CX, HINGE_INX);  sx1 = max(POCKET_CX, HINGE_INX);   // x[4,6]: 2mm lead-in
    // lead-in slot (sheet thickness, capped at the lid top) from the journal out to the inner face
    translate([sx0 - EPS, gy0, LID_Z_UNDER]) cube([sx1 - sx0 + 2*EPS, gy1 - gy0, LID_TOP_Z - LID_Z_UNDER]);
    // journal half-cylinder 2mm back from the face -> its cap (x[3,5]) clears the relief => retains the lid
    translate([POCKET_CX, gy0 - EPS, POCKET_CZ]) rotate([-90,0,0]) cylinder(h = gy1 - gy0 + 2*EPS, r = GROOVE_POCKET_R, $fn = 28);
    // eased mouth (relieves the cap inner-bottom corner): full middle prism + tapered ends
    mt = min(GROOVE_TAPER, (gy1 - gy0)/2 - EPS);
    translate([0, gy0 + mt, 0]) rotate([90,0,0]) translate([0,0,-((gy1 - mt) - (gy0 + mt))]) linear_extrude((gy1 - mt) - (gy0 + mt)) mouth_tri();
    mouth_taper(gy0, gy0 + mt);                       // taper out at the -y corner
    mouth_taper(gy1, gy1 - mt);                       // taper out at the +y corner
}

// --- lower the inner chamber dividers to the lid underside (mid-support, no sag).
//     Removes the divider top over the full length; outer walls keep full height.
module divider_lower() {
    // x-span is the CHAMBER BAY only [BAY_X0, BAY_X1] (+EPS overlap into the end walls so the
    // cut is manifold). The end/outer walls keep their full BODY_H tops; only the two INNER
    // dividers (DIV_KF, DIV_FS) are lowered.
    translate([BAY_X0 - EPS, DIV_KF[0], LID_Z_UNDER]) cube([BAY_X1 - BAY_X0 + 2*EPS, HOST_T, BODY_H - LID_Z_UNDER + CUT_OVER]);
    translate([BAY_X0 - EPS, DIV_FS[0], LID_Z_UNDER]) cube([BAY_X1 - BAY_X0 + 2*EPS, HOST_T, BODY_H - LID_Z_UNDER + CUT_OVER]);
}

// --- retaining clip (ADDED): a lip on the clip end wall, centred on CLIP_CY, that overhangs
//     the RECESSED lid top (LID_TOP_Z) by CLIP_LIP and holds it down. A lead-in ramp above the
//     lip (up to LID_TOP_Z+CLIP_RAMP_H, still below the rim) cams the lid under as it swings
//     closed. Anchored into the wall (x = CLIP_INX-CLIP_IN*HOST_T/2). Added AFTER the scallop
//     cut so the scallop never undercuts it. No longer protrudes above the rim.
module lid_clip() {
    translate([0, CLIP_CY - CLIP_W/2, 0]) rotate([90,0,0]) translate([0,0,-CLIP_W]) linear_extrude(CLIP_W)
        polygon([[CLIP_INX - CLIP_IN*HOST_T/2, LID_TOP_Z - 0.8],         // anchor low, into the wall (fuse)
                 [CLIP_INX + CLIP_IN*CLIP_LIP, LID_TOP_Z],               // lip tip: overhang over the lid top
                 [CLIP_INX + CLIP_IN*CLIP_LIP, LID_TOP_Z + 0.4],         // lip front
                 [CLIP_INX - CLIP_IN*HOST_T/2, LID_TOP_Z + CLIP_RAMP_H]]);// lead-in ramp up into the wall
}

// --- finger scallop (CUT): a semicircular dish in the rim's INNER edge at the clip, so a
//     fingertip reaches under the lid edge to release it. Interior half only (does not
//     touch the wall body or the clip's anchor).
module lid_scallop() {
    intersection() {
        translate([CLIP_INX, CLIP_CY, BODY_H - SCALLOP_DEPTH]) cylinder(h = SCALLOP_DEPTH + EPS, r = SCALLOP_W/2, $fn = 40);
        translate([CLIP_INX + (CLIP_IN<0 ? -SCALLOP_W : 0), CLIP_CY - SCALLOP_W, BODY_H - SCALLOP_DEPTH - EPS])
            cube([SCALLOP_W, 2*SCALLOP_W, SCALLOP_DEPTH + 2*EPS]);
    }
}

// ============================================================================
// The six pieces.  piece = intersection(box, cell + own male keys) - own sockets
//   A halves are MALE on the A/B seam (keep the key); B halves are FEMALE (slot).
//   On a chamber seam the LEFT chamber is male (+Y), the right chamber is female.
// ============================================================================
// Base half-lap shingling (FEMALE-first, Option 1):
//   A/B seam  -> the B half owns the bottom shelf (grows -X), A has the negative.
//   chamber   -> the UPPER chamber (fork, spoon) owns the shelf (grows -Y); the
//                lower chamber (knife, fork) has the negative.
//   Assembly order: spoon, fork, knife; B before A (male lowered onto female).
// Center crossings (104,81)&(104,186): the CHAMBER shelf (fork_A / spoon_A) owns the
//   crossing square; the B-half A/B shelf (knife_B / fork_B) is CLIPPED short of the
//   chamber seam by LAP_LEN so two shelves never collide.
module knife_A() {                                       // placed LAST; receives everything
    difference() {
        union() {
            intersection() {
                box();
                union() {
                    cell(-1, AB_SEAM, KNIFE_Y0 - 1, KNIFE_Y1);
                    ab_key(YC_OUTL); ab_key(YC_DIVKF); ch_key(SEAM_KF, ENDC_A);
                    ab_cap(YC_OUTL); ab_cap(YC_DIVKF); ch_cap(SEAM_KF, ENDC_A);  // hide tops (male)
                }
            }
            intersection() { lid_ledge(); cell(-1, AB_SEAM, KNIFE_Y0 - 1, KNIFE_Y1); }  // lid support ledge
        }
        lap_neg_X(KNIFE_Y0, KNIFE_Y1);            // receive knife_B's A/B shelf
        lap_neg_Y(SEAM_KF, 0, AB_SEAM);           // receive fork_A's chamber shelf
        hinge_groove(); divider_lower(); lid_scallop();   // lid cuts (groove hits A pieces; divider/scallop where present)
    }
}

module knife_B() {
    difference() {
        union() {
            intersection() {
                box();
                union() {
                    cell(AB_SEAM, TOTAL_LEN + 1, KNIFE_Y0 - 1, KNIFE_Y1);
                    ch_key(SEAM_KF, ENDC_B);
                    ch_cap(SEAM_KF, ENDC_B);                // hide top (male, chamber)
                }
            }
            lap_shelf_X(KNIFE_Y0, KNIFE_Y1 - LAP_LEN);  // A/B shelf -> knife_A (CLIPPED at y=81 crossing)
            intersection() { lid_ledge(); cell(AB_SEAM, TOTAL_LEN + 1, KNIFE_Y0 - 1, KNIFE_Y1); }  // lid support ledge
        }
        ab_socket(YC_OUTL); ab_socket(YC_DIVKF);
        ab_cap_neg(YC_OUTL); ab_cap_neg(YC_DIVKF);      // top recesses to receive knife_A's caps (female)
        lap_neg_Y(SEAM_KF, AB_SEAM, TOTAL_LEN);         // receive fork_B's chamber shelf
        hinge_groove(); divider_lower(); lid_scallop();   // lid cuts
    }
}

module fork_A() {
    difference() {
        union() {
            intersection() {
                box();
                union() {
                    cell(-1, AB_SEAM, FORK_Y0 + SEAM_EPS, FORK_Y1);  // -Y cut nudged off the divider face
                    ab_key(YC_DIVFS); ch_key(SEAM_FS, ENDC_A);
                    ab_cap(YC_DIVFS); ch_cap(SEAM_FS, ENDC_A);       // hide tops (male)
                }
            }
            lap_shelf_Y(SEAM_KF, 0, AB_SEAM);           // chamber shelf -> knife_A (owns crossing)
            intersection() { lid_ledge(); cell(-1, AB_SEAM, FORK_Y0 + SEAM_EPS, FORK_Y1); }  // lid support ledge (none in fork-A)
        }
        lap_neg_X(FORK_Y0, FORK_Y1);                    // receive fork_B's A/B shelf
        ch_socket(SEAM_KF, ENDC_A);
        ch_cap_neg(SEAM_KF, ENDC_A);                    // top recess to receive knife_A's chamber cap (female)
        lap_neg_Y(SEAM_FS, 0, AB_SEAM, LAP_LEN_FS);     // receive spoon_A's (small) chamber shelf
        hinge_groove(); divider_lower(); lid_scallop();   // lid cuts (groove = fork-A hinge segment; divider = DIV_FS)
    }
}

module fork_B() {
    union() {
        difference() {
            union() {
                intersection() {
                    box();
                    union() {
                        cell(AB_SEAM, TOTAL_LEN + 1, FORK_Y0 + SEAM_EPS, FORK_Y1);  // -Y cut nudged off the divider face
                        ch_key(SEAM_FS, ENDC_B);
                        ch_cap(SEAM_FS, ENDC_B);                // hide top (male, chamber)
                    }
                }
                lap_shelf_X(FORK_Y0, FORK_Y1 - LAP_LEN_FS); // A/B shelf -> fork_A (CLIPPED at y=186 crossing)
                lap_shelf_Y(SEAM_KF, AB_SEAM, TOTAL_LEN);   // chamber shelf -> knife_B
                intersection() { lid_ledge(); cell(AB_SEAM, TOTAL_LEN + 1, FORK_Y0 + SEAM_EPS, FORK_Y1); }  // lid ledge (clip-end run)
            }
            ab_socket(YC_DIVFS);
            ab_cap_neg(YC_DIVFS);                           // top recess to receive fork_A's A/B cap (female)
            ch_socket(SEAM_KF, ENDC_B);
            ch_cap_neg(SEAM_KF, ENDC_B);                    // top recess to receive knife_B's chamber cap (female)
            lap_neg_Y(SEAM_FS, AB_SEAM, TOTAL_LEN, LAP_LEN_FS); // receive spoon_B's (small) chamber shelf
            hinge_groove(); divider_lower(); lid_scallop();     // lid cuts (scallop lands here)
        }
        intersection() { lid_clip(); cell(AB_SEAM, TOTAL_LEN + 1, FORK_Y0 + SEAM_EPS, FORK_Y1); }  // retaining clip, added AFTER the scallop cut
    }
}

module spoon_A() {
    difference() {
        union() {
            intersection() {
                box();
                union() {
                    cell(-1, AB_SEAM, SPOON_Y0 + SEAM_EPS, SPOON_Y1 + 1);  // -Y cut nudged off the divider face
                    ab_key(YC_OUTR);
                    ab_cap(YC_OUTR);                        // hide top (male)
                }
            }
            lap_shelf_Y(SEAM_FS, 0, AB_SEAM, LAP_LEN_FS); // chamber shelf -> fork_A (small; owns crossing)
            intersection() { lid_ledge(); cell(-1, AB_SEAM, SPOON_Y0 + SEAM_EPS, SPOON_Y1 + 1); }  // lid support ledge (OUTER_R run)
        }
        lap_neg_X(SPOON_Y0, SPOON_Y1);                  // receive spoon_B's A/B shelf
        ch_socket(SEAM_FS, ENDC_A);
        ch_cap_neg(SEAM_FS, ENDC_A);                    // top recess to receive fork_A's chamber cap (female)
        hinge_groove(); divider_lower(); lid_scallop();   // lid cuts (groove = spoon-A hinge segment)
    }
}

module spoon_B() {                                      // placed FIRST; owns shelves
    difference() {
        union() {
            intersection() {
                box();
                union() {
                    cell(AB_SEAM, TOTAL_LEN + 1, SPOON_Y0 + SEAM_EPS, SPOON_Y1 + 1);  // -Y cut nudged off the divider face
                }
            }
            lap_shelf_X(SPOON_Y0, SPOON_Y1);            // A/B shelf -> spoon_A
            lap_shelf_Y(SEAM_FS, AB_SEAM, TOTAL_LEN, LAP_LEN_FS); // chamber shelf -> fork_B (small)
            intersection() { lid_ledge(); cell(AB_SEAM, TOTAL_LEN + 1, SPOON_Y0 + SEAM_EPS, SPOON_Y1 + 1); }  // lid ledge (OUTER_R + clip-end runs)
        }
        ab_socket(YC_OUTR);
        ab_cap_neg(YC_OUTR);                            // top recess to receive spoon_A's A/B cap (female)
        ch_socket(SEAM_FS, ENDC_B);
        ch_cap_neg(SEAM_FS, ENDC_B);                    // top recess to receive fork_B's chamber cap (female)
        hinge_groove(); divider_lower(); lid_scallop();   // lid cuts
    }
}

// Fast preview: the full continuous-chamfer box (no cuts). The six part modules
// above are the real, separable pieces. To instead see the TRUE assembled
// pieces with their joints (slower — 6 booleans), replace box(); below with:
//   knife_A(); knife_B(); fork_A(); fork_B(); spoon_A(); spoon_B();
module assembly() {
    box();
}

// ============================================================================
// Render dispatch
// ============================================================================
if      (part == "knife_A")  knife_A();
else if (part == "knife_B")  knife_B();
else if (part == "fork_A")   fork_A();
else if (part == "fork_B")   fork_B();
else if (part == "spoon_A")  spoon_A();
else if (part == "spoon_B")  spoon_B();
else if (part == "assembly") assembly();
else echo(str("Unknown part: ", part));
